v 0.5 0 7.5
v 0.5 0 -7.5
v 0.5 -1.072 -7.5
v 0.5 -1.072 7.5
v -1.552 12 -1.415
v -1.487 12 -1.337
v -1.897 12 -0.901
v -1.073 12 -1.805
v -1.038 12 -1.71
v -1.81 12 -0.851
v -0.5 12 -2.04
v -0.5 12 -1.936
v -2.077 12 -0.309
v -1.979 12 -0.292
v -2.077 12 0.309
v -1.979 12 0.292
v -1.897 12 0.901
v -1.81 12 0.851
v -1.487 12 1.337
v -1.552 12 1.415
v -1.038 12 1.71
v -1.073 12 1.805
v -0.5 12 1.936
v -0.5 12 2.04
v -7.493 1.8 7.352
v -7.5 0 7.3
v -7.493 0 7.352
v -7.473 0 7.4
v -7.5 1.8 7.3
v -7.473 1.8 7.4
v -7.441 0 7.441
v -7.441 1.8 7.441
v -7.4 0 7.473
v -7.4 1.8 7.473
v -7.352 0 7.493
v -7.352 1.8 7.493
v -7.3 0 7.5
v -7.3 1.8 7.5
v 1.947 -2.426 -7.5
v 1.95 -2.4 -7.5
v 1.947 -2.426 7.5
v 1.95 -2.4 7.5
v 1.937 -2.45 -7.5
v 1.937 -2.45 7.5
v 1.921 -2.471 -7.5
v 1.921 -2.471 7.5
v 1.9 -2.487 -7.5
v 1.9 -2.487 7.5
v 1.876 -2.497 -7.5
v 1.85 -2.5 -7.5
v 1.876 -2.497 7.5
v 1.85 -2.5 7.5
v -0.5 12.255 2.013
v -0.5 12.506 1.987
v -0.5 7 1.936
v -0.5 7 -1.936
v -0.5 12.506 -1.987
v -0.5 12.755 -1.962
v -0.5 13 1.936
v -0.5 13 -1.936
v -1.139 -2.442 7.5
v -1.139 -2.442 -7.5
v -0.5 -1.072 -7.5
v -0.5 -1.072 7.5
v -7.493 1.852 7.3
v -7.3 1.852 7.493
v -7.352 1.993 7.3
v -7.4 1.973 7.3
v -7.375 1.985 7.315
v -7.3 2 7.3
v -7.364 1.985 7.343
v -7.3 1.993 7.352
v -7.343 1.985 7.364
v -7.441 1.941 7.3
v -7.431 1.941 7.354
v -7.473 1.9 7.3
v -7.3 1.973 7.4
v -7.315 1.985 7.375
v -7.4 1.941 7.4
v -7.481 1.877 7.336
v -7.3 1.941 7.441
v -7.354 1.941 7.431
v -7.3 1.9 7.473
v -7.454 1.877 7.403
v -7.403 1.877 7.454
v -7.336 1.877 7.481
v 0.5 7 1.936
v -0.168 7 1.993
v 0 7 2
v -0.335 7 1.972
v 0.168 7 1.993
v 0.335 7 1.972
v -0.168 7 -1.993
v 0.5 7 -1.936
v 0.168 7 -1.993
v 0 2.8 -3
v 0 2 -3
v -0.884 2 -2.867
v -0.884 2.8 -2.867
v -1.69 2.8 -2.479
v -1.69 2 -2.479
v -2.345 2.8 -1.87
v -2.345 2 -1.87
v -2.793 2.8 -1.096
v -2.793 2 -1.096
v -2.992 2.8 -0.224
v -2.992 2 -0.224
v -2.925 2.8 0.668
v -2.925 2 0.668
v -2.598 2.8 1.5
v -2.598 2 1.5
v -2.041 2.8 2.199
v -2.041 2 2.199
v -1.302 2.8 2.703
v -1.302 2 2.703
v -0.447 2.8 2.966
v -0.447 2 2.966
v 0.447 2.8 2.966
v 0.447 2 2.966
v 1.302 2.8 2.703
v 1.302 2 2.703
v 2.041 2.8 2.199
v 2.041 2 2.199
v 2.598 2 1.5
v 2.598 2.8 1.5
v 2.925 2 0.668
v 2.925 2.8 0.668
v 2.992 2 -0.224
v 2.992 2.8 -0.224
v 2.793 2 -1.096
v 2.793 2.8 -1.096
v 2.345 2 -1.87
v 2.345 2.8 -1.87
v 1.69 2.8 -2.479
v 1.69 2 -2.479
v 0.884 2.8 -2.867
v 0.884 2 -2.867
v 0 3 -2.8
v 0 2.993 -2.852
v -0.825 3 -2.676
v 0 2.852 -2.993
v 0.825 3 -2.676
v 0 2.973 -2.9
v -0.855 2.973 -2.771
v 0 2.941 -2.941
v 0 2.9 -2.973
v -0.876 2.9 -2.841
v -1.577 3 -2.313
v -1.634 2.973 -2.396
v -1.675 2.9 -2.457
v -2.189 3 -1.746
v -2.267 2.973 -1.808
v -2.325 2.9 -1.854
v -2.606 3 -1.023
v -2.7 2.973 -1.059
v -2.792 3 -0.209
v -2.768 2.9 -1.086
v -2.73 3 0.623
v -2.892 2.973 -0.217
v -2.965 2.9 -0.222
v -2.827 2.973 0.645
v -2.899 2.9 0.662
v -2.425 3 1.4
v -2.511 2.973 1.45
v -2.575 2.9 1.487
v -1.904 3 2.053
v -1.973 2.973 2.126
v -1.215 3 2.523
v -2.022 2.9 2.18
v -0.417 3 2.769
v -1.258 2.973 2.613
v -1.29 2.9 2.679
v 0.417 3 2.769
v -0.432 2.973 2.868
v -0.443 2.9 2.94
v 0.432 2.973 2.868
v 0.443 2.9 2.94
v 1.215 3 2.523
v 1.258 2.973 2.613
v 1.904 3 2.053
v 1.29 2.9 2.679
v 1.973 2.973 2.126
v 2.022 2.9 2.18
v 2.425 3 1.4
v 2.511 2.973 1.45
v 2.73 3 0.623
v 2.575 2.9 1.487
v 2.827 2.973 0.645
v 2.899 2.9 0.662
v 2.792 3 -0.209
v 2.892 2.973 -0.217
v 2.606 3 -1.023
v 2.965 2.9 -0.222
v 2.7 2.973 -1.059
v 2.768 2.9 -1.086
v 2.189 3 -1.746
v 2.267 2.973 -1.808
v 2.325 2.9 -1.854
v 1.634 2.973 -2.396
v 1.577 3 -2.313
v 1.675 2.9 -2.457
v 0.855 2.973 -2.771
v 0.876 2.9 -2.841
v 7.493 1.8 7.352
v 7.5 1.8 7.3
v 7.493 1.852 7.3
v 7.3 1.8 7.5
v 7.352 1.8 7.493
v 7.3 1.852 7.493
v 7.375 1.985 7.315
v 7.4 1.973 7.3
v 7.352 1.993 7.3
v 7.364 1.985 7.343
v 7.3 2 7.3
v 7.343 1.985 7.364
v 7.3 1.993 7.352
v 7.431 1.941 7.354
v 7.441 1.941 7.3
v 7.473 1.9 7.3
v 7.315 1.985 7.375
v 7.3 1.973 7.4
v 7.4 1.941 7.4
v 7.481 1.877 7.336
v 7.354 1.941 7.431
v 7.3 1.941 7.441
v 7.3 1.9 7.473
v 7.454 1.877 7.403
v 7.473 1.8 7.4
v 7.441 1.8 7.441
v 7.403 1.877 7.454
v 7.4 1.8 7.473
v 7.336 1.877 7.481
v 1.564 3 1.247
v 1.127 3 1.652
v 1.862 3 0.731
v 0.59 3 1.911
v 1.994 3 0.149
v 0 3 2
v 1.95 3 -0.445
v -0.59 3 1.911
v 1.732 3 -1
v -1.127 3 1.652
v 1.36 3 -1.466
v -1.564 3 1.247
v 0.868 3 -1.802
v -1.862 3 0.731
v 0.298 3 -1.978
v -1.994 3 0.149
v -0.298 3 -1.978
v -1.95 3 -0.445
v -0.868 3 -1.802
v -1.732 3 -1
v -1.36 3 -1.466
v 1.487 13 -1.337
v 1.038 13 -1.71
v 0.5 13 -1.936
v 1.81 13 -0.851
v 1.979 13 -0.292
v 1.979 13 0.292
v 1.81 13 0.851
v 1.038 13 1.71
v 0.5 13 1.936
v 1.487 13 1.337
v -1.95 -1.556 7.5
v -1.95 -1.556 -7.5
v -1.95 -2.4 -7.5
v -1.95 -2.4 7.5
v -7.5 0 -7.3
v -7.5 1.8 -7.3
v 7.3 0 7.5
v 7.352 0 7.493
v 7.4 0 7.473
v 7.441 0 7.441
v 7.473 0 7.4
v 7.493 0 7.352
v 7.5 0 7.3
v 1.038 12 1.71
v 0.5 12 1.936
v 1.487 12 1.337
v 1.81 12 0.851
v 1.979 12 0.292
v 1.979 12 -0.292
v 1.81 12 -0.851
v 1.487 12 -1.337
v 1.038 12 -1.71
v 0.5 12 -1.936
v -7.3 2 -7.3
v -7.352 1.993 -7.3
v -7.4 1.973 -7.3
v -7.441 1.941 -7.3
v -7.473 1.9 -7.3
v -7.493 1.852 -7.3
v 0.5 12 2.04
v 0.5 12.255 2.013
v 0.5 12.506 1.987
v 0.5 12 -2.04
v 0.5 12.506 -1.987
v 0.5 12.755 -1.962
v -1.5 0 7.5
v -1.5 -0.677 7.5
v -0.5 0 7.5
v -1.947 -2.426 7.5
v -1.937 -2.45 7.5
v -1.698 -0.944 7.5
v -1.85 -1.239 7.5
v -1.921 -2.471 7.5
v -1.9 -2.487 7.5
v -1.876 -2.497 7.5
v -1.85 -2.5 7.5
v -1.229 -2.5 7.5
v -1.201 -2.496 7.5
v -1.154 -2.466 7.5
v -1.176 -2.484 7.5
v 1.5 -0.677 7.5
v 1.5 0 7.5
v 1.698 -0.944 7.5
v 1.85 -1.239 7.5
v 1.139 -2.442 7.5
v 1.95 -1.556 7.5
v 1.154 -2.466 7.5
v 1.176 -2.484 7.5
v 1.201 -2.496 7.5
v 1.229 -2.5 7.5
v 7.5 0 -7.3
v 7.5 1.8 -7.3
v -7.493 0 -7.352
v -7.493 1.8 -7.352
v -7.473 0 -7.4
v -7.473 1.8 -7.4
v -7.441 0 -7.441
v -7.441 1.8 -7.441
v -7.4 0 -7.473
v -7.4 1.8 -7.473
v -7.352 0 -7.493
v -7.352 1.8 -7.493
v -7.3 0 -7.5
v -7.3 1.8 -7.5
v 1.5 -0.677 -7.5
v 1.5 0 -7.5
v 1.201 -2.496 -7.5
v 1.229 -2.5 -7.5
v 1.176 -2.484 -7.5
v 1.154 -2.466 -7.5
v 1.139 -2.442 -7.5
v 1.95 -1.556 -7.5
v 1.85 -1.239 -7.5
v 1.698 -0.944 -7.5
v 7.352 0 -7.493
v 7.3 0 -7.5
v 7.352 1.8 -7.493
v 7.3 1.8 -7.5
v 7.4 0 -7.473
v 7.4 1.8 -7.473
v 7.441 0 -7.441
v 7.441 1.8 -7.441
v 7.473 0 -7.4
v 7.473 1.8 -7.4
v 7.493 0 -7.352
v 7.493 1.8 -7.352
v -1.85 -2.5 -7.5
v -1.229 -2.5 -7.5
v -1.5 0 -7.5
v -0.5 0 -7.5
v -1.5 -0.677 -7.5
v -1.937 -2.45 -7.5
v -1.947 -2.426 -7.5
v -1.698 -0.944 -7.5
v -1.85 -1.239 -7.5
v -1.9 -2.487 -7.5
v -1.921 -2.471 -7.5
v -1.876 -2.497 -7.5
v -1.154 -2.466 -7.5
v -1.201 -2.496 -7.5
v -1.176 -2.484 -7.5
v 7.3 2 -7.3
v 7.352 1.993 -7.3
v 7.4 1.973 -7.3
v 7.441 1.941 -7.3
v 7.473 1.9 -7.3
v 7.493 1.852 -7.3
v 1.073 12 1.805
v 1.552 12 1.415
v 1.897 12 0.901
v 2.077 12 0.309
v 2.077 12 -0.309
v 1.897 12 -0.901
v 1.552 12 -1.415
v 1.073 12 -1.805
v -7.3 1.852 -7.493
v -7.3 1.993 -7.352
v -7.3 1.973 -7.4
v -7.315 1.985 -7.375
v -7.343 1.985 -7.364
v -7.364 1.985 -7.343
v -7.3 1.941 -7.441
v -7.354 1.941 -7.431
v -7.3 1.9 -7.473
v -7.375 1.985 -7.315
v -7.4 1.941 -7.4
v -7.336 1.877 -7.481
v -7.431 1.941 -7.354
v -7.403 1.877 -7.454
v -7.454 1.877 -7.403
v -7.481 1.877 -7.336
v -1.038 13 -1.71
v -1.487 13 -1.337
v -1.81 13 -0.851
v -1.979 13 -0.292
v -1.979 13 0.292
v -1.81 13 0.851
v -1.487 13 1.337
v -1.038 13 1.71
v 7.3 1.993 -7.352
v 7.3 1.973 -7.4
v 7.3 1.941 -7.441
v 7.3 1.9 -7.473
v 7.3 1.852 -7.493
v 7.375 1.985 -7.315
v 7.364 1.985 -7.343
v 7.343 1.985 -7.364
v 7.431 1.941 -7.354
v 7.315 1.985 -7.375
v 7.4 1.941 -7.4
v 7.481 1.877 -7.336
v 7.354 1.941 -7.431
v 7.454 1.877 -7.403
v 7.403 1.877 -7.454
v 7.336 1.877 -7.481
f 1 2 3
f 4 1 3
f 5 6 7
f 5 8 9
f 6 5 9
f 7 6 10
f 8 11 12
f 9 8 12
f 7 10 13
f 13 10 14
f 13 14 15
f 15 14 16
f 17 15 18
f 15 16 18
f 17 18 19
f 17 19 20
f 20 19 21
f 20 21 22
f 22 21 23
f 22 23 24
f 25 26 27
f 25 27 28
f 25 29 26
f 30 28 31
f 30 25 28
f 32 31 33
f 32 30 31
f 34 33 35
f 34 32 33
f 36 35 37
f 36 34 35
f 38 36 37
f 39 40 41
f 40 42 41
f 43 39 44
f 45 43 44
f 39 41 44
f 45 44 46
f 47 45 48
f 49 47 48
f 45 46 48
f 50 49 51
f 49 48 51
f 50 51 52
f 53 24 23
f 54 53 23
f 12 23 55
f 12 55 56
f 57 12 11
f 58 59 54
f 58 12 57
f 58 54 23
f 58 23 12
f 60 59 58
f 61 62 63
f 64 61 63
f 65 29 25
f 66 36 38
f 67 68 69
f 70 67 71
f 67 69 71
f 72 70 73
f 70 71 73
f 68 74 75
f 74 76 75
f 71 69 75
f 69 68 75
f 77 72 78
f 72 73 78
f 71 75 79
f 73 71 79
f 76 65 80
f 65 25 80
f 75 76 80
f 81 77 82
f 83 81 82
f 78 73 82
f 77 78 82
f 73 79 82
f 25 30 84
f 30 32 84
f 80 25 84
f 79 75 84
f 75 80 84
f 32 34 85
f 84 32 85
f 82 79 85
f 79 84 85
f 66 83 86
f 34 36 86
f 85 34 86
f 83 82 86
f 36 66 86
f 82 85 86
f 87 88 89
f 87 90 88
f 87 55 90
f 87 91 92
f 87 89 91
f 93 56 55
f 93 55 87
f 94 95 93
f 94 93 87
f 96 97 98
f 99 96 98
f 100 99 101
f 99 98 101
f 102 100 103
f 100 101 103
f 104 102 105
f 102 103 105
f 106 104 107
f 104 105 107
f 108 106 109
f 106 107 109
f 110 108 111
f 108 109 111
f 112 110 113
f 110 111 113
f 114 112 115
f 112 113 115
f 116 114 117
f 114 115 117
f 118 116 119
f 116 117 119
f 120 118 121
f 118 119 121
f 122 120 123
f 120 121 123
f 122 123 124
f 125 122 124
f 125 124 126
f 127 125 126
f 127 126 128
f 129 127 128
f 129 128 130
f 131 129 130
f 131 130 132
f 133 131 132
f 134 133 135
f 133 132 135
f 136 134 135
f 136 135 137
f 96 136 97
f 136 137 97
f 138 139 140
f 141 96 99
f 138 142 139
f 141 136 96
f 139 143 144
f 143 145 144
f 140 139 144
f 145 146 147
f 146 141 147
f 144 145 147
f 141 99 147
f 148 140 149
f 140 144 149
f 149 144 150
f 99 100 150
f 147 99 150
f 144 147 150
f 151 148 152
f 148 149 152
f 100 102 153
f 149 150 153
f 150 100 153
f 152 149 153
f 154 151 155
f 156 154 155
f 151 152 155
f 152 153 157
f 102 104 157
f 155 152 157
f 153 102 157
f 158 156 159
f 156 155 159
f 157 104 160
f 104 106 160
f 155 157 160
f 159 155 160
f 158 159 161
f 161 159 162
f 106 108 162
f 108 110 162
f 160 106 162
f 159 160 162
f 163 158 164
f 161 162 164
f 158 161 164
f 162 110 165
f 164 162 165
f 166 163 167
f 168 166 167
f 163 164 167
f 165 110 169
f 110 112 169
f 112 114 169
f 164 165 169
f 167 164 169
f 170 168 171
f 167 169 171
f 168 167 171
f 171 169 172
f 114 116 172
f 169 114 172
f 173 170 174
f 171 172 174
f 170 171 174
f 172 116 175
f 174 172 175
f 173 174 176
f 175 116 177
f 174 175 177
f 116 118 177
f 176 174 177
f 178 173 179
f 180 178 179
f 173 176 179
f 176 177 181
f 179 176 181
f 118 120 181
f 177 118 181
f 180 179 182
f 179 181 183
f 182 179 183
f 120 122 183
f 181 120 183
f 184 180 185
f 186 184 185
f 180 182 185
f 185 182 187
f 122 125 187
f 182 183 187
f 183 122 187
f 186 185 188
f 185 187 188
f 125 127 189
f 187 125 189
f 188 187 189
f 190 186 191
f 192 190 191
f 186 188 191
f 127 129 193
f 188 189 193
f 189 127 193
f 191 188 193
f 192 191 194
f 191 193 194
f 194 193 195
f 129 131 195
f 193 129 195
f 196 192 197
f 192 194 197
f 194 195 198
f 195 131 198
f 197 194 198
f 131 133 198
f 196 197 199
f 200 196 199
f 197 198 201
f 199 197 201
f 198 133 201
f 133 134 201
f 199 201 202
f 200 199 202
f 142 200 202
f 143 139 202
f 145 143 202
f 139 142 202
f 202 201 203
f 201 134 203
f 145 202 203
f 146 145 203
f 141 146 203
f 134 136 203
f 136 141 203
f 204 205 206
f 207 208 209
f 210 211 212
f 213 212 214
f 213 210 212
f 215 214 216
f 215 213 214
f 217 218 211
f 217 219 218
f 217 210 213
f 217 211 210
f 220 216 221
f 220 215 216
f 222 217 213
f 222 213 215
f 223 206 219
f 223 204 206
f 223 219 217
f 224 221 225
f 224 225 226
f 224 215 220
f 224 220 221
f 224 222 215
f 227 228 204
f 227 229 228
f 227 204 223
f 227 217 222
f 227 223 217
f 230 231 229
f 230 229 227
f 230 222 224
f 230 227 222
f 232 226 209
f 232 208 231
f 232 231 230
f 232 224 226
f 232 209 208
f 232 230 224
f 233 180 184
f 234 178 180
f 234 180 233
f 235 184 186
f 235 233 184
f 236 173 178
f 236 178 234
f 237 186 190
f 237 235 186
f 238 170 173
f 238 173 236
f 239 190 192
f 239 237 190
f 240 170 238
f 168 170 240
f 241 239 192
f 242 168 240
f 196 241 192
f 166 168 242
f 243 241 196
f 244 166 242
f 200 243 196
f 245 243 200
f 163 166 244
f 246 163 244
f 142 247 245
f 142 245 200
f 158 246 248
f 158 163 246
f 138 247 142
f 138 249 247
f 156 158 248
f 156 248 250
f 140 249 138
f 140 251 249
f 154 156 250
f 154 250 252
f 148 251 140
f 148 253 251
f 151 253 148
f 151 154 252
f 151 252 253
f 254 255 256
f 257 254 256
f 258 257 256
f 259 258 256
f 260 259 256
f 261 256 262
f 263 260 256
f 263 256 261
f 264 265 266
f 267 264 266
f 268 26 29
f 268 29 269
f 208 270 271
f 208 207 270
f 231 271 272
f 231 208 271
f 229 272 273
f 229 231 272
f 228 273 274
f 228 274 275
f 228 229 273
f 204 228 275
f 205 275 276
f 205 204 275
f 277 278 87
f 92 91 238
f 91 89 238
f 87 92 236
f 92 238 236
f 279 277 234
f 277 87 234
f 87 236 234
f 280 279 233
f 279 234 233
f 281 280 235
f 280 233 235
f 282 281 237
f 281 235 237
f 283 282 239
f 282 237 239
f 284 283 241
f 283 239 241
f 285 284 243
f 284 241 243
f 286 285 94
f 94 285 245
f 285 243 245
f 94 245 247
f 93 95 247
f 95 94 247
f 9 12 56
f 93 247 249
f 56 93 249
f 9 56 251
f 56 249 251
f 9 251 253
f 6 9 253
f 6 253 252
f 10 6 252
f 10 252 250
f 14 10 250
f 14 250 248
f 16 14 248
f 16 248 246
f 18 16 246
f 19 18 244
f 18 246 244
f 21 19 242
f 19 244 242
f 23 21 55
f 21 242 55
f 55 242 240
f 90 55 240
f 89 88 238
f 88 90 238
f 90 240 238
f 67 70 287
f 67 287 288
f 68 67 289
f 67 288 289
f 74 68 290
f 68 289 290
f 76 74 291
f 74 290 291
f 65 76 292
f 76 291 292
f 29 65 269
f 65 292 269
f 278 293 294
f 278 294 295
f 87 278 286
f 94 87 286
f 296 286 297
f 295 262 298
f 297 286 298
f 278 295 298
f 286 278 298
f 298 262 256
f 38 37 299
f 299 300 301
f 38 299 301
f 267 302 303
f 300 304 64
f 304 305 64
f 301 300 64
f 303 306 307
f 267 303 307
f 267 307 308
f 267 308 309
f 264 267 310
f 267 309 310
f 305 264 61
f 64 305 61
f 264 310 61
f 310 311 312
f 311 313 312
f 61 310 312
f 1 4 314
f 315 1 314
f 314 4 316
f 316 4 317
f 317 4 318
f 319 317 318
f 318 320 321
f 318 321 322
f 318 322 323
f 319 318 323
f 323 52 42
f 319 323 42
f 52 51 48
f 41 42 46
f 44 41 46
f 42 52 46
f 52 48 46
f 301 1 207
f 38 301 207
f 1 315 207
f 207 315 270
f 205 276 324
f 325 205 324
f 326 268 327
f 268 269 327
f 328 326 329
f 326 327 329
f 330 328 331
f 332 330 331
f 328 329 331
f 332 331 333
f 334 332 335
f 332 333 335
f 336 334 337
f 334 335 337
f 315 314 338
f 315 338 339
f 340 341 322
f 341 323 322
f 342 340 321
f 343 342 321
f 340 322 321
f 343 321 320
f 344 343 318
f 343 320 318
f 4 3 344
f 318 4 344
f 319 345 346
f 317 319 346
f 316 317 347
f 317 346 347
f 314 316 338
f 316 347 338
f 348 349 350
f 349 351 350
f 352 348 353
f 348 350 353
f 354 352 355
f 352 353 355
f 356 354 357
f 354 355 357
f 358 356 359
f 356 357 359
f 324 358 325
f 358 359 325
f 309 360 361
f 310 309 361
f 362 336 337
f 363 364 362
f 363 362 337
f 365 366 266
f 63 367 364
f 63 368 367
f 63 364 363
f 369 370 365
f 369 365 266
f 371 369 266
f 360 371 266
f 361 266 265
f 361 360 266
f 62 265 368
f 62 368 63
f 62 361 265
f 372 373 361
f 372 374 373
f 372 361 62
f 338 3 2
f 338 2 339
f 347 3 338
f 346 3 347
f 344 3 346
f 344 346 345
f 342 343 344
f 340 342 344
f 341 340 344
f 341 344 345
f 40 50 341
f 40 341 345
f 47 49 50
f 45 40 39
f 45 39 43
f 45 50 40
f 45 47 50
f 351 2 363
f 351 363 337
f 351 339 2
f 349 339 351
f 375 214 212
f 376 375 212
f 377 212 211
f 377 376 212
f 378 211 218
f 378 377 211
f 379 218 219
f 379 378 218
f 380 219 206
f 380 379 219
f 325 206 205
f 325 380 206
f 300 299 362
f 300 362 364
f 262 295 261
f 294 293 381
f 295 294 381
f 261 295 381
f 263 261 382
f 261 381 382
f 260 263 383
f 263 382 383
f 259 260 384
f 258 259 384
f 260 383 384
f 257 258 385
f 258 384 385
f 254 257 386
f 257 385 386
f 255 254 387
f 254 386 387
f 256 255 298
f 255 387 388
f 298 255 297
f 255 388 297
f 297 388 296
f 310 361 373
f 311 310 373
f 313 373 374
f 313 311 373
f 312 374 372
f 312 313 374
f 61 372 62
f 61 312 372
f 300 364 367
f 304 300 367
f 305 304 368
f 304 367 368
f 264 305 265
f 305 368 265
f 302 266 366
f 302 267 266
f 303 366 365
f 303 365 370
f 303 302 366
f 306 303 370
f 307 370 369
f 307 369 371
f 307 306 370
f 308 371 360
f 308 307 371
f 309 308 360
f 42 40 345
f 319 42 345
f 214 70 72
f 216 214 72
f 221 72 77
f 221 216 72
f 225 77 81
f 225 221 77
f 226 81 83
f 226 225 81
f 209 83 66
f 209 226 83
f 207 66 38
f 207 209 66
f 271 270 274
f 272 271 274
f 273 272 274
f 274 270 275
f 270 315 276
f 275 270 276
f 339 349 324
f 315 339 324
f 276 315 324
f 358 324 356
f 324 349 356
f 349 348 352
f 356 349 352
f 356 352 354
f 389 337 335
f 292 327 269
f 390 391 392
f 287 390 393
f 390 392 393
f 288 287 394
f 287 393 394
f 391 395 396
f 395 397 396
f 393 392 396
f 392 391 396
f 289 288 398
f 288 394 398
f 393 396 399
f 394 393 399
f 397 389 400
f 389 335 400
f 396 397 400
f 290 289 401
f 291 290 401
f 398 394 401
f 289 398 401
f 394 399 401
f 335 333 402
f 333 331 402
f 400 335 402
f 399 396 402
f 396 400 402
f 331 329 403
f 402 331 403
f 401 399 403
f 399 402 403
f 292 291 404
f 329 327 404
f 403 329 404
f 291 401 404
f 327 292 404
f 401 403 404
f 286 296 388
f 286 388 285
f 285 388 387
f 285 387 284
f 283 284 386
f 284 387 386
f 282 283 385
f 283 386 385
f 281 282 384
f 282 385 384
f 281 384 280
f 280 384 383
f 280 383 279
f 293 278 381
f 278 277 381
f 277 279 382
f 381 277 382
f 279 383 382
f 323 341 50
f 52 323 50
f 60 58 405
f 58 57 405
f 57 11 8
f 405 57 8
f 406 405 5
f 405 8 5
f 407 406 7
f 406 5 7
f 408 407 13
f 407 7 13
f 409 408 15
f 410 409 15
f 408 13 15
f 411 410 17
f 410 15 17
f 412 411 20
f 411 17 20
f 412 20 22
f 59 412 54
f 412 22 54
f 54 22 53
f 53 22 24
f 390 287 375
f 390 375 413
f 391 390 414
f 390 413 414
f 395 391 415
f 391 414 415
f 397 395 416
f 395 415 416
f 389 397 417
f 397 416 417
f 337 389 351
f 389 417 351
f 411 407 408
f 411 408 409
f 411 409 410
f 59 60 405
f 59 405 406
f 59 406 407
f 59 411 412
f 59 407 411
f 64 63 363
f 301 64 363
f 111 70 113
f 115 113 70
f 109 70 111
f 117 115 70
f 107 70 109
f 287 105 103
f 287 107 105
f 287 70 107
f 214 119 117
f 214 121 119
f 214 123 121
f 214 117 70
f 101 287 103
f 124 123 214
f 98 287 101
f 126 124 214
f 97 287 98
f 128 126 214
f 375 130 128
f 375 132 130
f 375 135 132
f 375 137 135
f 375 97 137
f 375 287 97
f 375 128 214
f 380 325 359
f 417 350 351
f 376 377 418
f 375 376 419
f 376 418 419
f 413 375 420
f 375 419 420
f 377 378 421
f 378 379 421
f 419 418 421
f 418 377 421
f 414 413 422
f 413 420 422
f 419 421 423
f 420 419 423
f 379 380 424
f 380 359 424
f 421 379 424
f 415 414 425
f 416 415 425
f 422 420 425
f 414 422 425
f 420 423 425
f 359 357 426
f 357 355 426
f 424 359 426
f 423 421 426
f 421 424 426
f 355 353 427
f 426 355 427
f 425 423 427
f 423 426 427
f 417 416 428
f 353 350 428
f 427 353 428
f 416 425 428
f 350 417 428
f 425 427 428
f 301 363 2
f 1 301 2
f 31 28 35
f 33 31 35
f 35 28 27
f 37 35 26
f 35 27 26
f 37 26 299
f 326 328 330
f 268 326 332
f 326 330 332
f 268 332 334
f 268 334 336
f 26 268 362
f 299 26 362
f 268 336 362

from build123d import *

# Parameters (mm, degrees)
SKETCH_1_W           = 15
SKETCH_1_H           = 15
EXTRUDE_1_DEPTH      = 2
SKETCH_2_R           = 3
EXTRUDE_2_DEPTH      = 1
SKETCH_3_R           = 2
EXTRUDE_3_DEPTH      = 10
SKETCH_5_W           = 1
SKETCH_5_H           = 6
CUT_EXTRUDE_1_DEPTH  = 6
EXTRUDE_4_DEPTH      = 7.5
EXTRUDE_4_DEPTH_BACK = 7.5
FILLET_1_R           = 0.2
FILLET_2_R           = 0.1


with BuildPart() as part:
    # 草图1 → 凸台-拉伸1 (new body)
    with BuildSketch(Plane(origin=(0, 0, 0), x_dir=(1, 0, 0), z_dir=(0, 1, 0))):
        Rectangle(SKETCH_1_W, SKETCH_1_H)
    extrude(amount=EXTRUDE_1_DEPTH)

    # 草图2 → 凸台-拉伸2 (add)
    with BuildSketch(Plane(origin=(0, 2, 0), x_dir=(1, 0, 0), z_dir=(0, 1, 0))):
        Circle(SKETCH_2_R)
    extrude(amount=EXTRUDE_2_DEPTH)

    # 草图3 → 凸台-拉伸3 (add)
    with BuildSketch(Plane(origin=(0, 3, 0), x_dir=(1, 0, 0), z_dir=(0, 1, 0))):
        Circle(SKETCH_3_R)
    extrude(amount=EXTRUDE_3_DEPTH)

    # 草图4 → 旋转1 (revolve)
    with BuildSketch(Plane.XY):
        Polygon((0, 13), (-2, 13), (-2.1, 12), (0, 12), align=None)
    revolve(axis=Axis((0, 12, 0), (0, 1, 0)))

    # 草图5 → 切除-拉伸1 (cut)
    with BuildSketch(Plane(origin=(0, 13, 0), x_dir=(1, 0, 0), z_dir=(0, 1, 0))):
        Rectangle(SKETCH_5_W, SKETCH_5_H)
    extrude(amount=-CUT_EXTRUDE_1_DEPTH, mode=Mode.SUBTRACT)

    # 草图6 → 凸台-拉伸4 (add, two sides: drawn at the far end of the back side and taken through both)
    with BuildSketch(Plane.XY.offset(-EXTRUDE_4_DEPTH_BACK)):
        with BuildLine():
            Line((-0.5, 0), (-1.5, 0))
            Line((-1.5, 0), (-1.5, -0.677124344))
            ThreePointArc((-1.5, -0.677124344), (-1.780042303, -1.088161527), (-1.95, -1.555590279))
            Line((-1.95, -1.555590279), (-1.95, -2.5))
            Line((-1.95, -2.5), (-1.165769145, -2.5))
            Line((-1.165769145, -2.5), (-0.5, -1.07225346))
            Line((-0.5, -1.07225346), (-0.5, 0))
        make_face()
        with BuildLine():
            Line((0.5, 0), (0.5, -1.07225346))
            Line((0.5, -1.07225346), (1.165769145, -2.5))
            Line((1.165769145, -2.5), (1.95, -2.5))
            Line((1.95, -2.5), (1.95, -1.555590279))
            ThreePointArc((1.95, -1.555590279), (1.780042303, -1.088161527), (1.5, -0.677124344))
            Line((1.5, -0.677124344), (1.5, 0))
            Line((1.5, 0), (0.5, 0))
        make_face()
    extrude(amount=EXTRUDE_4_DEPTH + EXTRUDE_4_DEPTH_BACK)

    # 圆角1
    fillet_1_edges = [part.edges().sort_by_distance(p)[0] for p in [
        (-7.5, 1, -7.5),
        (7.5, 1, -7.5),
        (7.5, 1, 7.5),
        (-7.5, 1, 7.5),
        (7.5, 2, 0),
        (0, 2, -7.5),
        (-7.5, 2, 0),
        (0, 2, 7.5),
        (-3, 3, 0),
    ]]
    fillet(fillet_1_edges, radius=FILLET_1_R)

    # 圆角2
    fillet_2_edges = [part.edges().sort_by_distance(p)[0] for p in [
        (-1.95, -2.5, 0),
        (-1.165769145, -2.5, 0),
        (1.165769145, -2.5, 0),
        (1.95, -2.5, 0),
    ]]
    fillet(fillet_2_edges, radius=FILLET_2_R)


solid = part.part
